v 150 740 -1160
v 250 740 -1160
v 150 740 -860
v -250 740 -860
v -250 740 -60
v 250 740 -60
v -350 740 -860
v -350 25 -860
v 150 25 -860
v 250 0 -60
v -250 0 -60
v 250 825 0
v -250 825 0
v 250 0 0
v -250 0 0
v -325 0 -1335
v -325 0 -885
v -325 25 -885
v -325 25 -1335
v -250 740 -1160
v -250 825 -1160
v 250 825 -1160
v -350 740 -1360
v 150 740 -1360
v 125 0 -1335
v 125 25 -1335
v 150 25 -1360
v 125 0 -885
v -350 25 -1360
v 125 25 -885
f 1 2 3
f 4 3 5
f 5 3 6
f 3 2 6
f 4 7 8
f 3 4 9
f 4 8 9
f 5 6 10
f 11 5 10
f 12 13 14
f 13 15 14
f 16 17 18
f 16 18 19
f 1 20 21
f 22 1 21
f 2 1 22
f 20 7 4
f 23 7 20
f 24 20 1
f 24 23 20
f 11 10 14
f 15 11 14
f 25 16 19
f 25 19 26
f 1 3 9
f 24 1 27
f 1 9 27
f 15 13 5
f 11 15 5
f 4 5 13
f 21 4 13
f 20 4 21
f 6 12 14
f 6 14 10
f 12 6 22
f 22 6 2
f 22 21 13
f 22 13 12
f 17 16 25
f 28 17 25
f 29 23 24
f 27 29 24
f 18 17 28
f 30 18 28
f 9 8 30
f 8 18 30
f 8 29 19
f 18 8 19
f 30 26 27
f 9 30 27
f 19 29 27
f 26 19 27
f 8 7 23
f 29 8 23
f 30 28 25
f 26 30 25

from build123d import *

# Parameters (mm, degrees)
BOSS_EXTRUDE1_DEPTH = 250
SKETCH3_W           = 450
SKETCH3_H           = 450
BOSS_EXTRUDE2_DEPTH = 740
BOSS_EXTRUDE3_START = 25
SKETCH3_3_W         = 500
SKETCH3_3_H         = 500
SKETCH3_3_W_2       = 450
SKETCH3_3_H_2       = 450
BOSS_EXTRUDE3_DEPTH = 715
SKETCH4_W           = 500
SKETCH4_H           = 1160
BOSS_EXTRUDE4_DEPTH = 25


with BuildPart() as part:
    # Sketch2 → Boss-Extrude1 (new, symmetric)
    with BuildSketch(Plane(origin=(0, 0, 0), x_dir=(0, 0, -1), z_dir=(1, 0, 0))):
        Polygon((0, 0), (0, 800), (1160, 800), (1160, 740), (60, 740), (60, 0), align=None)
    extrude(amount=BOSS_EXTRUDE1_DEPTH, both=True)

    # Sketch3 → Boss-Extrude2 (add)
    with BuildSketch(Plane(origin=(0, 0, 0), x_dir=(1, 0, 0), z_dir=(0, 1, 0))):
        with Locations((-100, 1110)):
            Rectangle(SKETCH3_W, SKETCH3_H)
    extrude(amount=BOSS_EXTRUDE2_DEPTH)

    # Sketch3<3> → Boss-Extrude3 (add)
    with BuildSketch(Plane(origin=(0, 0, 0), x_dir=(1, 0, 0), z_dir=(0, 1, 0)).offset(BOSS_EXTRUDE3_START)):
        with Locations((-100, 1110)):
            Rectangle(SKETCH3_3_W, SKETCH3_3_H)
        with Locations((-100, 1110)):
            Rectangle(SKETCH3_3_W_2, SKETCH3_3_H_2, mode=Mode.SUBTRACT)
    extrude(amount=BOSS_EXTRUDE3_DEPTH)

    # Sketch4 → Boss-Extrude4 (add)
    with BuildSketch(Plane(origin=(0, 800, 0), x_dir=(1, 0, 0), z_dir=(0, 1, 0))):
        with Locations((0, 580)):
            Rectangle(SKETCH4_W, SKETCH4_H)
    extrude(amount=BOSS_EXTRUDE4_DEPTH)


solid = part.part
